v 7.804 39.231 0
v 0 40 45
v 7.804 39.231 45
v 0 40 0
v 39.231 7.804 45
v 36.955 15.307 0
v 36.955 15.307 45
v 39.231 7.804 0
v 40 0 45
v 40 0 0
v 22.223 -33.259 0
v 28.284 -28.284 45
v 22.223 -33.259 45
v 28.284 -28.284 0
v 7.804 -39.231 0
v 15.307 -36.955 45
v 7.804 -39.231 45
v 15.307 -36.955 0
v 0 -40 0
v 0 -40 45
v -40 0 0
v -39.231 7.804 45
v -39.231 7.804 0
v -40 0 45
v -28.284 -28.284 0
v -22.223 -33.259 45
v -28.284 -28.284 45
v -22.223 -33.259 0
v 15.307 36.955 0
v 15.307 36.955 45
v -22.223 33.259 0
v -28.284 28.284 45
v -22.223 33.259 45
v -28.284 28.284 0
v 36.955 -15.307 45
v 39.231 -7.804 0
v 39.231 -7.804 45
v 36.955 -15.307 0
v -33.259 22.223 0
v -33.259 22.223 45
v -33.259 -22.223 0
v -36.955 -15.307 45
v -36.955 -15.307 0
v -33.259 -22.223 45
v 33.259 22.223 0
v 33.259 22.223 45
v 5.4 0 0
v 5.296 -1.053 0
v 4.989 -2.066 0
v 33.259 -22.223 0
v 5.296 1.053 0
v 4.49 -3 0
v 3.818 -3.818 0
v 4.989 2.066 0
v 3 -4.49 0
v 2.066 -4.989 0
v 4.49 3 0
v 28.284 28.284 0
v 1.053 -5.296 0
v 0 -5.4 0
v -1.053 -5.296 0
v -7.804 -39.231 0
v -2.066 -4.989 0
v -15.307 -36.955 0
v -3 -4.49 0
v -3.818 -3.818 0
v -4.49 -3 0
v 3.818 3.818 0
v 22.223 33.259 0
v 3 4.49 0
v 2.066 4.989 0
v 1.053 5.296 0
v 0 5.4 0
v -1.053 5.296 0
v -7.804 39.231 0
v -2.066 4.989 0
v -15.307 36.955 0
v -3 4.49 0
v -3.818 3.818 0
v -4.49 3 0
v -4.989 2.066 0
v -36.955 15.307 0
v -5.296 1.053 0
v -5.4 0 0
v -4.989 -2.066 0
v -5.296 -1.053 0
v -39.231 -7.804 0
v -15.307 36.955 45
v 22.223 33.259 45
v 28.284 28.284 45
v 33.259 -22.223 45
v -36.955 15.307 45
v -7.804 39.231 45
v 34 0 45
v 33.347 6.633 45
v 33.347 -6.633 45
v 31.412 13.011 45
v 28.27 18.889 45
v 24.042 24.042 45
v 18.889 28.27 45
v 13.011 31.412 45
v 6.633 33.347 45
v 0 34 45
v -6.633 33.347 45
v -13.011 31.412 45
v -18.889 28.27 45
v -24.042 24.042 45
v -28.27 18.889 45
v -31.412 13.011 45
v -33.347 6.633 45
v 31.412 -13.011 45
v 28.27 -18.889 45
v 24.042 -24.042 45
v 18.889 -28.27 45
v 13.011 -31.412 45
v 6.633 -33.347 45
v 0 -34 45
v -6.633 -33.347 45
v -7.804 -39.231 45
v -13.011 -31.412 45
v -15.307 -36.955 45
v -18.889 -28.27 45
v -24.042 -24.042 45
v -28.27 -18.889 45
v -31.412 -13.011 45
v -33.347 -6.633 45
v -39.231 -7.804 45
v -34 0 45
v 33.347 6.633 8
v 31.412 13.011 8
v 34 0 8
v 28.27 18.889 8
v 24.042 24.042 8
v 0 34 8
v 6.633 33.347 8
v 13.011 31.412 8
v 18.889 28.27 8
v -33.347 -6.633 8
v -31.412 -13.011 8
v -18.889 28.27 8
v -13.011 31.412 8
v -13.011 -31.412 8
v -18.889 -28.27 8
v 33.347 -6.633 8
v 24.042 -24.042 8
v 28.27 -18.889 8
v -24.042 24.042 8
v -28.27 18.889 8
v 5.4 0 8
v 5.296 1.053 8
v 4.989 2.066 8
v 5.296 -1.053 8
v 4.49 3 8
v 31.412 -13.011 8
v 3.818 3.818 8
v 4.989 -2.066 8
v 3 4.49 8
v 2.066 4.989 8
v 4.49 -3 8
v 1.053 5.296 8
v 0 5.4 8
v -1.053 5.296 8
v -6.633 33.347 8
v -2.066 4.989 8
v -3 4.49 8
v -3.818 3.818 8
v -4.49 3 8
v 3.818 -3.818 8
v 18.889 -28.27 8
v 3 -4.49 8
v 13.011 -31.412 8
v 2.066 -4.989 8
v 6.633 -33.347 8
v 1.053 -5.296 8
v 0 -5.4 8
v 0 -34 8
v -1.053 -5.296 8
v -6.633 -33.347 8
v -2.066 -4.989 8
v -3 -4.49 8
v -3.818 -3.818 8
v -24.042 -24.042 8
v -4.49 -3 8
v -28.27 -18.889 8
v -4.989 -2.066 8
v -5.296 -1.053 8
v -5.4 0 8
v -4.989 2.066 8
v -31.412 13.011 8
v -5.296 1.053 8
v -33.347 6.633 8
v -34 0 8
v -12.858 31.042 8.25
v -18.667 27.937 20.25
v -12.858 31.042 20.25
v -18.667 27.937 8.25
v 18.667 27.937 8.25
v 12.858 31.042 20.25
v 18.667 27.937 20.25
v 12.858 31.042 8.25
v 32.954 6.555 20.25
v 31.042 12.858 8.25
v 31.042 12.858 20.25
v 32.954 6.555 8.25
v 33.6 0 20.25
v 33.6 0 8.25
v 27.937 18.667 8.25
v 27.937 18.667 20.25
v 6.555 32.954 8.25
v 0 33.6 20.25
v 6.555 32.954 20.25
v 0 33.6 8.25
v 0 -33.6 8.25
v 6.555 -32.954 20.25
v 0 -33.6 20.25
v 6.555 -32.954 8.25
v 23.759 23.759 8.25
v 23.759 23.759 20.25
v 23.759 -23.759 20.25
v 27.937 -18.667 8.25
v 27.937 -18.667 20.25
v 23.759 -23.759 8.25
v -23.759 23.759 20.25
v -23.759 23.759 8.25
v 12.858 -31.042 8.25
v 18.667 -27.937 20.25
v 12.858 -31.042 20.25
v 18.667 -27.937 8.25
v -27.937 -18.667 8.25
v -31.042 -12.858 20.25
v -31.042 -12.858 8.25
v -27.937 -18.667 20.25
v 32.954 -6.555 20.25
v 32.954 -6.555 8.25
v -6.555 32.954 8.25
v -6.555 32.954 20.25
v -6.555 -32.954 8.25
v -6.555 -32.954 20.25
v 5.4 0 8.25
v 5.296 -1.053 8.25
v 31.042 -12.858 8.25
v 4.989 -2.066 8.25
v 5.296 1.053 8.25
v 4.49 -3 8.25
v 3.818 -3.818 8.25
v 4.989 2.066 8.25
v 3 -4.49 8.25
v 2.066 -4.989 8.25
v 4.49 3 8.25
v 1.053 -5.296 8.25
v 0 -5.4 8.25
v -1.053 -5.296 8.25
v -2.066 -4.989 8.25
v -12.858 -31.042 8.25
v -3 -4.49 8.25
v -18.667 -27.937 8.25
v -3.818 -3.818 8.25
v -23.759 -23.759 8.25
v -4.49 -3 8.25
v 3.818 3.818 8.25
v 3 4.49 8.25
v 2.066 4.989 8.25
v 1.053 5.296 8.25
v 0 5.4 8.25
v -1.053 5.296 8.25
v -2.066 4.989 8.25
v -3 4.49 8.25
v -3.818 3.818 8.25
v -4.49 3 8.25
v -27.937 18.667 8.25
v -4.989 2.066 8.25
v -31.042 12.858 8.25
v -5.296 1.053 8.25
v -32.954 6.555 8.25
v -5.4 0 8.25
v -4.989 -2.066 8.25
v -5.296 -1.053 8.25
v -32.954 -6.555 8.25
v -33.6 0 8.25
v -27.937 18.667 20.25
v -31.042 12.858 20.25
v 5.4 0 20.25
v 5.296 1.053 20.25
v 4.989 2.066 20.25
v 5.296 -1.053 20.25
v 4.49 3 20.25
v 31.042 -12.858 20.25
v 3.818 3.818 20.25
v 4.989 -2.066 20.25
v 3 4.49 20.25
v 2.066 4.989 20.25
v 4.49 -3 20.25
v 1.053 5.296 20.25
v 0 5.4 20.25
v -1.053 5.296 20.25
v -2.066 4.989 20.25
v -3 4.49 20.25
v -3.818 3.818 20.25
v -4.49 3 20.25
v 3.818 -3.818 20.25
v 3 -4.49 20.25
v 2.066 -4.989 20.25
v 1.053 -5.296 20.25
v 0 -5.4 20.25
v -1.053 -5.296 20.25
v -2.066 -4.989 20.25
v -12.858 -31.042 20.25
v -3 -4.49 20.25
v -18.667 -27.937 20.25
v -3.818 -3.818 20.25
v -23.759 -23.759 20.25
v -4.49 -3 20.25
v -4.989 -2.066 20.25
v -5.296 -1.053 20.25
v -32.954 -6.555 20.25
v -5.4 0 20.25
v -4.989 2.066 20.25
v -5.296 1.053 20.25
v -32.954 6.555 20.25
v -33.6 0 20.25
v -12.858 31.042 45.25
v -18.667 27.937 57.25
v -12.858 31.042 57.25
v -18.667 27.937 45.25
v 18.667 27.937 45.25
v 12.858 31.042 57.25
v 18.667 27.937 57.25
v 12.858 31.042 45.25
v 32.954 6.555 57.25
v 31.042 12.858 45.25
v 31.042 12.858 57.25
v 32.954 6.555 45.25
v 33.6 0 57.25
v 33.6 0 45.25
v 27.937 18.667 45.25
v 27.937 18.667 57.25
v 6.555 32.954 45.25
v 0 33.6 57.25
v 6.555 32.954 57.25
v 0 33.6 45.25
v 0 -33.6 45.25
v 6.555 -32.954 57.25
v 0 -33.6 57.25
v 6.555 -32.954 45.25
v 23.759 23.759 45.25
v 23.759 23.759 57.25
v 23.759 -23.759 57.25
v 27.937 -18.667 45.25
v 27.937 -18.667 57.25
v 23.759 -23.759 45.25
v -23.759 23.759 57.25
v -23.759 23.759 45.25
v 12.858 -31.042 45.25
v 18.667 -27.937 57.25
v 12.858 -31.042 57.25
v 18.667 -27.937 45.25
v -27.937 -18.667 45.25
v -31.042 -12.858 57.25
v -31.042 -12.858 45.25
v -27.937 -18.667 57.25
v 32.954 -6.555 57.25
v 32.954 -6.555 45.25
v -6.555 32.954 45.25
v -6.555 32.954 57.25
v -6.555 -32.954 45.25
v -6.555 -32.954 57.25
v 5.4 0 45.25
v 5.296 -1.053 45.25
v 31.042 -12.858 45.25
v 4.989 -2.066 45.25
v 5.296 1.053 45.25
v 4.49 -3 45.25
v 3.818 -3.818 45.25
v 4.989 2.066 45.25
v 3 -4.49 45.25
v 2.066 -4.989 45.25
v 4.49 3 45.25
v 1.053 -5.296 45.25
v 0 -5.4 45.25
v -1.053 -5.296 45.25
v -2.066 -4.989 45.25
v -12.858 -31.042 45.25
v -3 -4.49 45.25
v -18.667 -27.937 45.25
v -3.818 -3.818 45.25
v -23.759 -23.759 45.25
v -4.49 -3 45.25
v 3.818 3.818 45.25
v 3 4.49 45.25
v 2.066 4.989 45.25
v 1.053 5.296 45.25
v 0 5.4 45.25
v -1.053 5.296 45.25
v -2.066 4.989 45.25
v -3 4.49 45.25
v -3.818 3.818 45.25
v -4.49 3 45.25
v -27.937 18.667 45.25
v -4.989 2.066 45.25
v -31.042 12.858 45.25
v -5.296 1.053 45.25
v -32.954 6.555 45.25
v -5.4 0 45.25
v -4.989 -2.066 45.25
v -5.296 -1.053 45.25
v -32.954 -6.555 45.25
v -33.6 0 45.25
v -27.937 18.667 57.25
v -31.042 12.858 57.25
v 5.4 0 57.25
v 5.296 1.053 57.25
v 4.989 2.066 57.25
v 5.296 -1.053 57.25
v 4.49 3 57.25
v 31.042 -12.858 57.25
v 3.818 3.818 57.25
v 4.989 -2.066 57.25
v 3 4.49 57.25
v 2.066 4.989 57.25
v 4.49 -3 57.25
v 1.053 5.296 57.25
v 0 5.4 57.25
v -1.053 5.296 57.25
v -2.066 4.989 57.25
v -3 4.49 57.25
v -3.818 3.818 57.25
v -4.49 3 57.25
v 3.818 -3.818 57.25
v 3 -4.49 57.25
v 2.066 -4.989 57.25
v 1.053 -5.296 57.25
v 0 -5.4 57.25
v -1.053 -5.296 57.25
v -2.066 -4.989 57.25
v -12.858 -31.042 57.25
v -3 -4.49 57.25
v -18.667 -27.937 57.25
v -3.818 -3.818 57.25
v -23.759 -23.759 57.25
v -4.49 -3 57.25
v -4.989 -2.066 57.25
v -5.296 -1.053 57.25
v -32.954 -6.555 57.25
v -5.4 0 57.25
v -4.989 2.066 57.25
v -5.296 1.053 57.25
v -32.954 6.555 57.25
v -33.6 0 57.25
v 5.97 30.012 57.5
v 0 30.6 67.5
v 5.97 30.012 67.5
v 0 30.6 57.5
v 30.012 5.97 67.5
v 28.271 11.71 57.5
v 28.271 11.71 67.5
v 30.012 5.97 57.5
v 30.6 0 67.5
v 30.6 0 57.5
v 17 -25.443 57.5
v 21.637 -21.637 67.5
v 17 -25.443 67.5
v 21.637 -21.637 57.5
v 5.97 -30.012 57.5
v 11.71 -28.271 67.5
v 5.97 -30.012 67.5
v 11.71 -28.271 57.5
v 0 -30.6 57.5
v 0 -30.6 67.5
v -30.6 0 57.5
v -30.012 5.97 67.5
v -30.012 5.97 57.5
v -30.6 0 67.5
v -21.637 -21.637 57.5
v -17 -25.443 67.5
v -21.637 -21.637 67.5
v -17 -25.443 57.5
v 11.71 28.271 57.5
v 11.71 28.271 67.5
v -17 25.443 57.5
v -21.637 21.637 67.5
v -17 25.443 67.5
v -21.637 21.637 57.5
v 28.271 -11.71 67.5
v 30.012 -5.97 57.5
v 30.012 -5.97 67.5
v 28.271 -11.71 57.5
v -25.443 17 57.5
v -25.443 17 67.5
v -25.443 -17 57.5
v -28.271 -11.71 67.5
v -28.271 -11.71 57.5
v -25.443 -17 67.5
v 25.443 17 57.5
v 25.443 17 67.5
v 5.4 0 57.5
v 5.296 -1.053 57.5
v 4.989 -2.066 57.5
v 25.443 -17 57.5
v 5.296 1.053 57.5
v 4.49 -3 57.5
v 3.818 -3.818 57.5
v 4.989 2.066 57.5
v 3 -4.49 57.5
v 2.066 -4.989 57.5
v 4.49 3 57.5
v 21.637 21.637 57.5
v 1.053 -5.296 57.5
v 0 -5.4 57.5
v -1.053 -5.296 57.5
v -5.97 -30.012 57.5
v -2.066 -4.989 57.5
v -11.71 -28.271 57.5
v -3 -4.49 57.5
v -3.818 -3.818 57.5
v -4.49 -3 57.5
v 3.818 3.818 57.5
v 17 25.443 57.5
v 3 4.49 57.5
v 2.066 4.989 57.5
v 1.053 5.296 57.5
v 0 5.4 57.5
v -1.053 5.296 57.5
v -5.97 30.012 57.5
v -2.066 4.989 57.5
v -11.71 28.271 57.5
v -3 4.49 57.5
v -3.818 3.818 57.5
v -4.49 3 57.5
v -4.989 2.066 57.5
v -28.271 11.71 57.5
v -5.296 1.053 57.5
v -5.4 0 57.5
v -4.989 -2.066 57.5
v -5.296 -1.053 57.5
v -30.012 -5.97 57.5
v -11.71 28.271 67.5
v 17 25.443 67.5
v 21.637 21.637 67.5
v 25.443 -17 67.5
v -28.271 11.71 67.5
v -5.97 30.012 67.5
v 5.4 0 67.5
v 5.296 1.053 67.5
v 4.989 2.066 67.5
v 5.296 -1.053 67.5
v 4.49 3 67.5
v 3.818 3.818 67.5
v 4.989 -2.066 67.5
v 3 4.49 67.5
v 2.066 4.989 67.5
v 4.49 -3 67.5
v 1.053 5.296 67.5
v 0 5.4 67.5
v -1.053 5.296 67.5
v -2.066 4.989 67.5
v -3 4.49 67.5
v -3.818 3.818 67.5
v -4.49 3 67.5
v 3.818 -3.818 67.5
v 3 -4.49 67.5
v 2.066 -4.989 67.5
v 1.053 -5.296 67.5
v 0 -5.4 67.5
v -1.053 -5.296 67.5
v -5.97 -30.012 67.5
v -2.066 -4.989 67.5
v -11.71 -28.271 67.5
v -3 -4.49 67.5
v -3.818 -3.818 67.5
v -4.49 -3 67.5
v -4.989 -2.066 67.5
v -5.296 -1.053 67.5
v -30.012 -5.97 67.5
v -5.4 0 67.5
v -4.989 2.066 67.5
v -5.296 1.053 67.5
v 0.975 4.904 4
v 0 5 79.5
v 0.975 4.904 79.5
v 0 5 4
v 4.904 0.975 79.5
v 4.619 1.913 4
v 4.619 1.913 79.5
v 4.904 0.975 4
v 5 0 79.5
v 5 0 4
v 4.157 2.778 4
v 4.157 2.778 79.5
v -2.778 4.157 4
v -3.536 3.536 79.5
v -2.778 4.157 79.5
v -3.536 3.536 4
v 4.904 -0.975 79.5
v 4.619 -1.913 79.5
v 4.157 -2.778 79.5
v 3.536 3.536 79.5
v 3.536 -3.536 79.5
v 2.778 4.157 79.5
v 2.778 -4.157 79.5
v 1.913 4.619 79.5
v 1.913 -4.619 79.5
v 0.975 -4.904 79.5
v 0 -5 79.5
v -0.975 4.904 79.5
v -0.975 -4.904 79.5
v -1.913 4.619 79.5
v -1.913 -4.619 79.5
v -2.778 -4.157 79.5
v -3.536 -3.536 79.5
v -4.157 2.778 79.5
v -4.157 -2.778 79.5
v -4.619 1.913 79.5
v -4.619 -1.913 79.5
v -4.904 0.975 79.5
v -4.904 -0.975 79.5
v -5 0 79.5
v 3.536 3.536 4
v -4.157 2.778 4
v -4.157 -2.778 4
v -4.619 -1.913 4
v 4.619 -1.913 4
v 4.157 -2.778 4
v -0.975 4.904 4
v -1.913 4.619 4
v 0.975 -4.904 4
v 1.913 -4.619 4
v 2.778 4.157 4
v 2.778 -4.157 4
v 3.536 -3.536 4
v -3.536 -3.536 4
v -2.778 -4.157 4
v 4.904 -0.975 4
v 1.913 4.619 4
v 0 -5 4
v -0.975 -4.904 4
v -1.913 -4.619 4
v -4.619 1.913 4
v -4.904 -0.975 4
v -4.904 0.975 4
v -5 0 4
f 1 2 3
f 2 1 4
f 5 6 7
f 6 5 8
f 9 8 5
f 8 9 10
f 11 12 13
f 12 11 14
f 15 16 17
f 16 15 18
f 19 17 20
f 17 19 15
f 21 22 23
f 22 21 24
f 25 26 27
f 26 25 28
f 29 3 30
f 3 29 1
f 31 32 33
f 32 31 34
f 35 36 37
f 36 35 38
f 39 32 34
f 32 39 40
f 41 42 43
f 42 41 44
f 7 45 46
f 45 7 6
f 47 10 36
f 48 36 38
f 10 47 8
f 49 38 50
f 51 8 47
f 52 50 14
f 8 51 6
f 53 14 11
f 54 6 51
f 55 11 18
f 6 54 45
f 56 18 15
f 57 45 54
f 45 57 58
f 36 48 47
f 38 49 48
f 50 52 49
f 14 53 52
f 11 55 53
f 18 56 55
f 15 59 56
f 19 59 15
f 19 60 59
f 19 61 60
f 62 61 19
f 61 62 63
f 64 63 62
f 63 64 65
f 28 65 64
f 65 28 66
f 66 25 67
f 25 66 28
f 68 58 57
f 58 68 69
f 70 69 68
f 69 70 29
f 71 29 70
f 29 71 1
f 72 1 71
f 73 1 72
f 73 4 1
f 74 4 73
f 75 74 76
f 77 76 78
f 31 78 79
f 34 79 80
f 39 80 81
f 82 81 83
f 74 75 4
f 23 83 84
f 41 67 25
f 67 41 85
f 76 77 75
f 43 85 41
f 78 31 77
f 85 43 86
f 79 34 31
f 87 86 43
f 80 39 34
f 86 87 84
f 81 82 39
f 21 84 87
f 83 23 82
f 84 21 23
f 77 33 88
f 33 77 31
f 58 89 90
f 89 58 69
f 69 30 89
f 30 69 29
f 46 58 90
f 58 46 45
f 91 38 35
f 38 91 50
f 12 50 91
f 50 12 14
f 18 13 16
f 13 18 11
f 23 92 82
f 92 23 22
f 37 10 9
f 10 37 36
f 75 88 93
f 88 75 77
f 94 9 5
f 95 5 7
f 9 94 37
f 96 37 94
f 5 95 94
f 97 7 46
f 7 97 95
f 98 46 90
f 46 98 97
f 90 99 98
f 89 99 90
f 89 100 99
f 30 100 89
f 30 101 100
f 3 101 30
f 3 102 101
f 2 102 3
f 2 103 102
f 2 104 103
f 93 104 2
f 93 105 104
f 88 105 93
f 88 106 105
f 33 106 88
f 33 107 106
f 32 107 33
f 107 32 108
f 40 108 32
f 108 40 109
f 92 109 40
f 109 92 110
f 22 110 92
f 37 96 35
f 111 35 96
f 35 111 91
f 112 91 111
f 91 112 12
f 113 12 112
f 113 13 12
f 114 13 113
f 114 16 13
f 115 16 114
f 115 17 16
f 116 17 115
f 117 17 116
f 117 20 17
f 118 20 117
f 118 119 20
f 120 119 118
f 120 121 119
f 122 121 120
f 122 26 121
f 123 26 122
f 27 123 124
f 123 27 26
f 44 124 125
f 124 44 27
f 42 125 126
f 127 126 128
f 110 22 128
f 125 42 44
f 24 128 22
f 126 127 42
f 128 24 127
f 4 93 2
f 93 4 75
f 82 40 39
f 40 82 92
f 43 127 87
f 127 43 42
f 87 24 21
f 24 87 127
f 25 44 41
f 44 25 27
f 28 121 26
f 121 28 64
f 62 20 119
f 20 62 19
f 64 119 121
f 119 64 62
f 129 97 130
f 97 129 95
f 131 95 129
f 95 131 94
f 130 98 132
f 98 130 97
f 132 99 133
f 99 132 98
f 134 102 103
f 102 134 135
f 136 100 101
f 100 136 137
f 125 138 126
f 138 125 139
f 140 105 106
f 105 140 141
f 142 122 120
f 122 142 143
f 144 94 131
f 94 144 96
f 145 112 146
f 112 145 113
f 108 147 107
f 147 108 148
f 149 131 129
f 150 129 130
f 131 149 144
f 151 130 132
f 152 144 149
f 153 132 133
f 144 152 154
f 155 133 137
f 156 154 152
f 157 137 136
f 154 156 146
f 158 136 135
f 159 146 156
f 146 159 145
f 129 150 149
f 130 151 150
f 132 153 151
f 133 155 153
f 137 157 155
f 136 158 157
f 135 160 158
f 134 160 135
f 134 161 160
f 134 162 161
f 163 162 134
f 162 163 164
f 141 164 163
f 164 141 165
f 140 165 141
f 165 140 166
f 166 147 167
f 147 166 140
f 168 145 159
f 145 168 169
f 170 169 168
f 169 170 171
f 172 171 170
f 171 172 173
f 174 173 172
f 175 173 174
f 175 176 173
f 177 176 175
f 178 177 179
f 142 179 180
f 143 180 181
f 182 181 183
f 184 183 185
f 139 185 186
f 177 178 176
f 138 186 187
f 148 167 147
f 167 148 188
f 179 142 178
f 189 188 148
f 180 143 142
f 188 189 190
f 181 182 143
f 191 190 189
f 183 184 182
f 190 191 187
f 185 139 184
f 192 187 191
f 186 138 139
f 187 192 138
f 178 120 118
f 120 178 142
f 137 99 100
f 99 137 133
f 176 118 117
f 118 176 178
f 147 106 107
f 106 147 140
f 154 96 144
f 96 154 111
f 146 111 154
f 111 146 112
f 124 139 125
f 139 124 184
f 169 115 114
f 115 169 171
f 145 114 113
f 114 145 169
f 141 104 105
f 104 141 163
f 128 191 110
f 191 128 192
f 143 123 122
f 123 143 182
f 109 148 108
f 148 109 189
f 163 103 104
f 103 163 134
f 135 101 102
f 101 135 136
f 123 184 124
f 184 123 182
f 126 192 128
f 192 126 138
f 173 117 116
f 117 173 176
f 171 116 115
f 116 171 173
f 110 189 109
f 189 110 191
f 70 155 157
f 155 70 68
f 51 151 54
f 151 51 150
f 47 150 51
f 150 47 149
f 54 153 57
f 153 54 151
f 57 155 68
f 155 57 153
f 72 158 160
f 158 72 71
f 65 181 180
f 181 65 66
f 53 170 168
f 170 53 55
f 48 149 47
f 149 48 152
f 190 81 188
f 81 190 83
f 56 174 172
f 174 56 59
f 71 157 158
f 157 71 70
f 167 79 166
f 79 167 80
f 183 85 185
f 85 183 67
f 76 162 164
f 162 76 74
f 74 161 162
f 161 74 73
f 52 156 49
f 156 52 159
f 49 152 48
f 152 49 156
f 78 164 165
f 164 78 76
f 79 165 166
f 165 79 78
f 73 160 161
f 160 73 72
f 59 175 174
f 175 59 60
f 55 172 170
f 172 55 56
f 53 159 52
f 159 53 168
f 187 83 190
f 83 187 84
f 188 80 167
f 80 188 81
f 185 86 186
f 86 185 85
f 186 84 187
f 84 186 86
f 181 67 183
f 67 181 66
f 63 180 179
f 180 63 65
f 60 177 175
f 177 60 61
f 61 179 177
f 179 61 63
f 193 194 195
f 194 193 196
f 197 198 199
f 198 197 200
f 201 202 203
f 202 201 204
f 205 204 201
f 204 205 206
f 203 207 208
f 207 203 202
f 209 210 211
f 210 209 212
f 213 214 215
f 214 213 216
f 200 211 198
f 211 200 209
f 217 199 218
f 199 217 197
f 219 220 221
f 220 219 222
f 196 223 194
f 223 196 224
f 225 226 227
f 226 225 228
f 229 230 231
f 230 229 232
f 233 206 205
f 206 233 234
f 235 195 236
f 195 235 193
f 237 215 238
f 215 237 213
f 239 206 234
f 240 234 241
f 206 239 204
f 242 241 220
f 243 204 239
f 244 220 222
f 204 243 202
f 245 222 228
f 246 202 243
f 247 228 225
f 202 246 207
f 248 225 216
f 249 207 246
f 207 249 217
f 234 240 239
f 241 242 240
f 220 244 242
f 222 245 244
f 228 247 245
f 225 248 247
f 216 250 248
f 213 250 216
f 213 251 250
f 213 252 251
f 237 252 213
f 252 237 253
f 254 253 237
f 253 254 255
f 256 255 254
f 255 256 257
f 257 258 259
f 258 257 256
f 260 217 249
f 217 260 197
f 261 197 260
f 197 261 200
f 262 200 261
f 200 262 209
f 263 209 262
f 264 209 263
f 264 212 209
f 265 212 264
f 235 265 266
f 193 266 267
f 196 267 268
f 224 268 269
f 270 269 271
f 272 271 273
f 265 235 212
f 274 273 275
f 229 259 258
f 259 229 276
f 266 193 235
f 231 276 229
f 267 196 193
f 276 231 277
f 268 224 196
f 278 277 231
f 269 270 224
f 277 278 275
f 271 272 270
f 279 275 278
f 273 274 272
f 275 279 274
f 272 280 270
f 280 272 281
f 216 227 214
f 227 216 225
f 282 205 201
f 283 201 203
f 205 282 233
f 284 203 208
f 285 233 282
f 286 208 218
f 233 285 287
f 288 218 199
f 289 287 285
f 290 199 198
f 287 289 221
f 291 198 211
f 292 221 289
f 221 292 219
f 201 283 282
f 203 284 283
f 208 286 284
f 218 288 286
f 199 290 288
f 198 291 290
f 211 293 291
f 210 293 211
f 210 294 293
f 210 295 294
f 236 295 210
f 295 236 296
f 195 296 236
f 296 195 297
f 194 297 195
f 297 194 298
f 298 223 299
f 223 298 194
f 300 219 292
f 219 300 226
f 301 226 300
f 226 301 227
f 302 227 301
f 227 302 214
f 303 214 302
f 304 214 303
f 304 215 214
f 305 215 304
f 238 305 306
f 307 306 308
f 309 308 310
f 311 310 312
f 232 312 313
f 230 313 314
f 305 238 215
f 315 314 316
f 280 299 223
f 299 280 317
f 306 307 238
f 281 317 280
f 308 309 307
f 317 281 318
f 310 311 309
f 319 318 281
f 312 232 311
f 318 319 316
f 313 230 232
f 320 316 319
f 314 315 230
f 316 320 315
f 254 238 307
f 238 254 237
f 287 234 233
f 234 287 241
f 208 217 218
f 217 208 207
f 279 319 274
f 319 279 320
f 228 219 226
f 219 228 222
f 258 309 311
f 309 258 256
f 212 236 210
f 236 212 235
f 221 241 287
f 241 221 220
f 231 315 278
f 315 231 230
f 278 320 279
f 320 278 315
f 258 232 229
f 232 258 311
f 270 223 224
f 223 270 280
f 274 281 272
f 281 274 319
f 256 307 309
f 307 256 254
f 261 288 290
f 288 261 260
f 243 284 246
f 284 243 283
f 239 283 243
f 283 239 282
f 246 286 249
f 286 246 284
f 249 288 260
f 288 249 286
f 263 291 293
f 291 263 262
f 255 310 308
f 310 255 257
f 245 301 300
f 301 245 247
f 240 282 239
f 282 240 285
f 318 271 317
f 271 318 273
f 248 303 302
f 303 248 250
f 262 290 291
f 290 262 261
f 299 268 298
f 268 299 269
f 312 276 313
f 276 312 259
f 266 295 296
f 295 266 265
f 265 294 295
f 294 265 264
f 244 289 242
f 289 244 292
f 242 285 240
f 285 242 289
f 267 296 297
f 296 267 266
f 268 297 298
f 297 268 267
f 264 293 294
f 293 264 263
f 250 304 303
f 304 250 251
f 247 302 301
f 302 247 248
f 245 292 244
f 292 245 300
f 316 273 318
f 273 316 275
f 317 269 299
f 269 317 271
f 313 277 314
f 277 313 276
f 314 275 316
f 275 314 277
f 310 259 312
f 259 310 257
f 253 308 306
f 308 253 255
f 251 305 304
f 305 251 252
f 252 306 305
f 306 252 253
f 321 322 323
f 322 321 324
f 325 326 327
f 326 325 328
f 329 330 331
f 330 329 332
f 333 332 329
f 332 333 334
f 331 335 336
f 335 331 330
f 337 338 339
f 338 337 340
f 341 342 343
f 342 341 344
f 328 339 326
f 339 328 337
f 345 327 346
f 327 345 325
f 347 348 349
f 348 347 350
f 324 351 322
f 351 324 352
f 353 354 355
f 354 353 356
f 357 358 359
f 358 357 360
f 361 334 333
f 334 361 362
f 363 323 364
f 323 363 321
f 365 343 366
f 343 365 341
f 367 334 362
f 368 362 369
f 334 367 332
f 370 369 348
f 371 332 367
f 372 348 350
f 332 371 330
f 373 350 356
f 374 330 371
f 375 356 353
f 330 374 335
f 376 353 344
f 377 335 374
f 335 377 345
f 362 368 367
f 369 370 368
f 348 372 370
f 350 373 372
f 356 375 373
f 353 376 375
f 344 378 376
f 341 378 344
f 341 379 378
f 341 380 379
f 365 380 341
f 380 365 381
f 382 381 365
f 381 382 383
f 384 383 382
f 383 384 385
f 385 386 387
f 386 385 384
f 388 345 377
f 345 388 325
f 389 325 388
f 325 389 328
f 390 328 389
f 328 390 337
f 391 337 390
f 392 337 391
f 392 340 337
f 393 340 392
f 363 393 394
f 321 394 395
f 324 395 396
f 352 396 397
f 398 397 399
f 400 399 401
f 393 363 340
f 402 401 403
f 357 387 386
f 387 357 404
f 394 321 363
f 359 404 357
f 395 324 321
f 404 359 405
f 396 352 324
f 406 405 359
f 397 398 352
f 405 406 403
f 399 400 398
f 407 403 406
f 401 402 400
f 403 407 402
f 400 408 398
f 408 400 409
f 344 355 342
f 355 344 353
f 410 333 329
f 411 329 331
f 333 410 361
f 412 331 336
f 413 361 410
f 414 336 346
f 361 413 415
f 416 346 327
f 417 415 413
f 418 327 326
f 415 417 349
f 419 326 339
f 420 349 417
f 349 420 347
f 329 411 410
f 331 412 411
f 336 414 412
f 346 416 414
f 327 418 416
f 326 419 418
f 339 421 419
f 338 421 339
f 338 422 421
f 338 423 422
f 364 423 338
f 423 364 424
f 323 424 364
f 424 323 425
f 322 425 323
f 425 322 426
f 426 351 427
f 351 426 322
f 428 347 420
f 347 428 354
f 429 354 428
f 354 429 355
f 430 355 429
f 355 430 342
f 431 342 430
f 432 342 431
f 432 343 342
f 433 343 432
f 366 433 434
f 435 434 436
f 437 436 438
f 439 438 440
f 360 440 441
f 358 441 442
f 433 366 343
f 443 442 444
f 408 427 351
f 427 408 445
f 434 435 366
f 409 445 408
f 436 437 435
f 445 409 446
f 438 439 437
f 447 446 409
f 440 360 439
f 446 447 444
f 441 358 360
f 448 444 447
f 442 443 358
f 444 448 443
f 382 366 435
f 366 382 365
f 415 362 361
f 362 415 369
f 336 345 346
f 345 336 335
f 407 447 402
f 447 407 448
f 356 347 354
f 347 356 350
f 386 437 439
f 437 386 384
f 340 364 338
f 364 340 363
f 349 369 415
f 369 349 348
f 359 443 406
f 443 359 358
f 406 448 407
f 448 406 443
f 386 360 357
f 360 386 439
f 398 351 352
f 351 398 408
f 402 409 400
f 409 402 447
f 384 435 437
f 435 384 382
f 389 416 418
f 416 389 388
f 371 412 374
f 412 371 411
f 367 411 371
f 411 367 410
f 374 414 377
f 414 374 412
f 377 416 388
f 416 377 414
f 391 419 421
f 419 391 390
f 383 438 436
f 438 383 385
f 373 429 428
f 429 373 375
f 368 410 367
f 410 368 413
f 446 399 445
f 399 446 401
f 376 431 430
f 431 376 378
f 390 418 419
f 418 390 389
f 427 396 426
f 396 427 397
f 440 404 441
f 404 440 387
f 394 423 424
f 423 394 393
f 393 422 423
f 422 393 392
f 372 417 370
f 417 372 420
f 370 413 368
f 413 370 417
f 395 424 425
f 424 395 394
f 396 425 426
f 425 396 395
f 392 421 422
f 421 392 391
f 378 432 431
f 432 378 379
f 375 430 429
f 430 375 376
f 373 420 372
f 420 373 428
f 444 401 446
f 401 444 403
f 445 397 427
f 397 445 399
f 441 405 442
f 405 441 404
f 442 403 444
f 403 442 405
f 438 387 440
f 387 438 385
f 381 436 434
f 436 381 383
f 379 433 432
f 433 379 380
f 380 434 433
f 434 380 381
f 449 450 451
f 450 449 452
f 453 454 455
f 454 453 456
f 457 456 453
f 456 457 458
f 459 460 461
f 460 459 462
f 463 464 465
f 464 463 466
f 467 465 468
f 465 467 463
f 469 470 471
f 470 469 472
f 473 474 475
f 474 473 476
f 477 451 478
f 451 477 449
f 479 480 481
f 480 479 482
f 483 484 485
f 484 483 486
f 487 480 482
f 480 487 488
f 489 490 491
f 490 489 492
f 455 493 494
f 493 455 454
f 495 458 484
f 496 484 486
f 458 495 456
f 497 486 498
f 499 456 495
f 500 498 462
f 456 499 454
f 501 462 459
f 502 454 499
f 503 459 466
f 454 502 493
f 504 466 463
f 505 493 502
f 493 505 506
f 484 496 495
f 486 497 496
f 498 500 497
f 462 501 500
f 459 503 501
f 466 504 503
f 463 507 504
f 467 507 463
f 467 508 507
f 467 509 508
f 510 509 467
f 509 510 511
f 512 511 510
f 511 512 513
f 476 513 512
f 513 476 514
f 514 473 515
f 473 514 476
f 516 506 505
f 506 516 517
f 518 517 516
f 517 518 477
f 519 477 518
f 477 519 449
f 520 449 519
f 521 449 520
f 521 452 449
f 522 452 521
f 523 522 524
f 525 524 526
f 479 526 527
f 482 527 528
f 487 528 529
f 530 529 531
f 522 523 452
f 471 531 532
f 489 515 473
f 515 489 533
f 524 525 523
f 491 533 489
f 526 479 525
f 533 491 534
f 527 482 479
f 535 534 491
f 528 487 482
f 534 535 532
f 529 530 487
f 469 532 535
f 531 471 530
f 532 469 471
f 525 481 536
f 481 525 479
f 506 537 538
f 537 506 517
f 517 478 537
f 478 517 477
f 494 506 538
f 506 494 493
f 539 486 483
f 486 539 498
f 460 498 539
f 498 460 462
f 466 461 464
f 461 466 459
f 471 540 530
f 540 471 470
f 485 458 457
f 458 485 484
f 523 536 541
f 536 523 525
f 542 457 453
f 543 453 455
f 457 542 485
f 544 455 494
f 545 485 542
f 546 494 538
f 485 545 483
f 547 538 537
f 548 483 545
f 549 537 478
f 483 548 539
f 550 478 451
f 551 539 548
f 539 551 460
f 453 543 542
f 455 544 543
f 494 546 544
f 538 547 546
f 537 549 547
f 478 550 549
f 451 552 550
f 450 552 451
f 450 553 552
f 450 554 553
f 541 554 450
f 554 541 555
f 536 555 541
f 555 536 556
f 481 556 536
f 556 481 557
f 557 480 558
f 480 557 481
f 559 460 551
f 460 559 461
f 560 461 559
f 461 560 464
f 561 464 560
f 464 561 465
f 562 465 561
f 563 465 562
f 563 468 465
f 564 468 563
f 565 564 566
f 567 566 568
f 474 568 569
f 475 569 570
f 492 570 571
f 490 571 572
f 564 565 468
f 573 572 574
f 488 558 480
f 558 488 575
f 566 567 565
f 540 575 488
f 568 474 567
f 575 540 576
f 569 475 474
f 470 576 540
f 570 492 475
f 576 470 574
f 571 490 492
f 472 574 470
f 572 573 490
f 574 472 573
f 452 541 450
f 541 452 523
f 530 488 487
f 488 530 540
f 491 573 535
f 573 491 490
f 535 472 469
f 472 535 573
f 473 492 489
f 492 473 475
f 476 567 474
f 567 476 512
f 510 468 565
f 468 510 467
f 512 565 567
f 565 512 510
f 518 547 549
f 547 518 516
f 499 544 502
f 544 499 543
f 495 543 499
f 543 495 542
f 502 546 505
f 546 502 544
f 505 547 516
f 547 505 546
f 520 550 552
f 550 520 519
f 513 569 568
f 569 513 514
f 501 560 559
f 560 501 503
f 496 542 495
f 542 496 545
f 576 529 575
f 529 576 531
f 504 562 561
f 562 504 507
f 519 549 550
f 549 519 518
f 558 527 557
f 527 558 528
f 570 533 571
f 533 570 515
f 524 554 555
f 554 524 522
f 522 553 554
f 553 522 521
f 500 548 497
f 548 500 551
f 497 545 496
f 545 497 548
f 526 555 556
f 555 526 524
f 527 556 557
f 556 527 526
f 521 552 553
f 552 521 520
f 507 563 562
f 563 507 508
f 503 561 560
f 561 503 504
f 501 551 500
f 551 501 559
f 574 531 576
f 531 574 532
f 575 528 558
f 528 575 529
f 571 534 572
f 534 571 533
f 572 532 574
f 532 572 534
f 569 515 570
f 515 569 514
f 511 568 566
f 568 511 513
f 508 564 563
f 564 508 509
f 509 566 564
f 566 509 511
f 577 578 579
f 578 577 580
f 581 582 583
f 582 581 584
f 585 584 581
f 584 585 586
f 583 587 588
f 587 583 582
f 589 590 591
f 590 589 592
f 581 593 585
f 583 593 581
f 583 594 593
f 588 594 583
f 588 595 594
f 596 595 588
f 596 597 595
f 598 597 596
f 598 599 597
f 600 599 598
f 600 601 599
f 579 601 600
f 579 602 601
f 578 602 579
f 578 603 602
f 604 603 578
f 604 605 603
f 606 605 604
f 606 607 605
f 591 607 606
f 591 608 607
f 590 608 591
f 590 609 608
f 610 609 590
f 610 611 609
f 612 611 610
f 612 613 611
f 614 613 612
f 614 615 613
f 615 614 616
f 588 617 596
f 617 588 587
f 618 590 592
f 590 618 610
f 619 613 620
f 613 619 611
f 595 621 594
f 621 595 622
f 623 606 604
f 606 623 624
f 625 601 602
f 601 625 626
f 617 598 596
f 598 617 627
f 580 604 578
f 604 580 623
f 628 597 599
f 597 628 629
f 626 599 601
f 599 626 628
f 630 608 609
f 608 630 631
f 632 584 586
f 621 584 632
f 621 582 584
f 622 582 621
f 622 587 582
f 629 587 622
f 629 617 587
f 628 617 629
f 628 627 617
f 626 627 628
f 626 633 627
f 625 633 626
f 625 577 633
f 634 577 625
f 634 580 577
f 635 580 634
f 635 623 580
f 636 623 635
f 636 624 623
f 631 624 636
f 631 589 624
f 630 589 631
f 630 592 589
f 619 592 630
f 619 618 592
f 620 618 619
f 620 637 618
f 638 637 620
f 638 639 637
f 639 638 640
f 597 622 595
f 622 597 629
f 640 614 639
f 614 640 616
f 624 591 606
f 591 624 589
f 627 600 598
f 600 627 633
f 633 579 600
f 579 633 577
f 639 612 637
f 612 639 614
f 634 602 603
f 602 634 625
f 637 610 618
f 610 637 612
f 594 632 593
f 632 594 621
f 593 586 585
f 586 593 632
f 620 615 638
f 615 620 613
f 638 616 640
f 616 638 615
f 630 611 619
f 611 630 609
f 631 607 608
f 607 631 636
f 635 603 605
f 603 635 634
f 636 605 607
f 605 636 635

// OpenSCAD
$fn = 32;

// ------------------------------------------------------------------------
// Bearing housing: housing d80, two bearings and a shaft
// Every part is its own module, assembly() places them once.
// ------------------------------------------------------------------------

// --- part 1 ---
module housing() {
  difference() {
    cylinder(h = 45, d = 80);
    translate([0, 0, 8]) cylinder(h = 38, d = 68);
    translate([0, 0, -1]) cylinder(h = 10, d = 10.8);
  }
}

// --- part 2 ---
module bearing_lower() {
  difference() {
      translate([0, 0, 0]) cylinder(h = 12, d = 67.2);
      translate([0, 0, -1]) cylinder(h = 14, d = 10.8);
    }
}

// --- part 3 ---
module bearing_upper() {
  difference() {
      translate([0, 0, 0]) cylinder(h = 12, d = 67.2);
      translate([0, 0, -1]) cylinder(h = 14, d = 10.8);
    }
}

// --- part 4 ---
module spacer() {
  difference() {
      translate([0, 0, 0]) cylinder(h = 10, d = 61.2);
      translate([0, 0, -1]) cylinder(h = 12, d = 10.8);
    }
}

// --- part 5 ---
module shaft() {
  translate([0, 0, -37.75]) cylinder(h = 75.5, d = 10);
}

// --- assembly ---
module assembly() {
  translate([0, 0, 0]) rotate([0, 0, 0]) housing();
  translate([0, 0, 8.25]) rotate([0, 0, 0]) bearing_lower();
  translate([0, 0, 45.25]) rotate([0, 0, 0]) bearing_upper();
  translate([0, 0, 57.5]) rotate([0, 0, 0]) spacer();
  translate([0, 0, 41.75]) rotate([0, 0, 0]) shaft();
}

assembly();
